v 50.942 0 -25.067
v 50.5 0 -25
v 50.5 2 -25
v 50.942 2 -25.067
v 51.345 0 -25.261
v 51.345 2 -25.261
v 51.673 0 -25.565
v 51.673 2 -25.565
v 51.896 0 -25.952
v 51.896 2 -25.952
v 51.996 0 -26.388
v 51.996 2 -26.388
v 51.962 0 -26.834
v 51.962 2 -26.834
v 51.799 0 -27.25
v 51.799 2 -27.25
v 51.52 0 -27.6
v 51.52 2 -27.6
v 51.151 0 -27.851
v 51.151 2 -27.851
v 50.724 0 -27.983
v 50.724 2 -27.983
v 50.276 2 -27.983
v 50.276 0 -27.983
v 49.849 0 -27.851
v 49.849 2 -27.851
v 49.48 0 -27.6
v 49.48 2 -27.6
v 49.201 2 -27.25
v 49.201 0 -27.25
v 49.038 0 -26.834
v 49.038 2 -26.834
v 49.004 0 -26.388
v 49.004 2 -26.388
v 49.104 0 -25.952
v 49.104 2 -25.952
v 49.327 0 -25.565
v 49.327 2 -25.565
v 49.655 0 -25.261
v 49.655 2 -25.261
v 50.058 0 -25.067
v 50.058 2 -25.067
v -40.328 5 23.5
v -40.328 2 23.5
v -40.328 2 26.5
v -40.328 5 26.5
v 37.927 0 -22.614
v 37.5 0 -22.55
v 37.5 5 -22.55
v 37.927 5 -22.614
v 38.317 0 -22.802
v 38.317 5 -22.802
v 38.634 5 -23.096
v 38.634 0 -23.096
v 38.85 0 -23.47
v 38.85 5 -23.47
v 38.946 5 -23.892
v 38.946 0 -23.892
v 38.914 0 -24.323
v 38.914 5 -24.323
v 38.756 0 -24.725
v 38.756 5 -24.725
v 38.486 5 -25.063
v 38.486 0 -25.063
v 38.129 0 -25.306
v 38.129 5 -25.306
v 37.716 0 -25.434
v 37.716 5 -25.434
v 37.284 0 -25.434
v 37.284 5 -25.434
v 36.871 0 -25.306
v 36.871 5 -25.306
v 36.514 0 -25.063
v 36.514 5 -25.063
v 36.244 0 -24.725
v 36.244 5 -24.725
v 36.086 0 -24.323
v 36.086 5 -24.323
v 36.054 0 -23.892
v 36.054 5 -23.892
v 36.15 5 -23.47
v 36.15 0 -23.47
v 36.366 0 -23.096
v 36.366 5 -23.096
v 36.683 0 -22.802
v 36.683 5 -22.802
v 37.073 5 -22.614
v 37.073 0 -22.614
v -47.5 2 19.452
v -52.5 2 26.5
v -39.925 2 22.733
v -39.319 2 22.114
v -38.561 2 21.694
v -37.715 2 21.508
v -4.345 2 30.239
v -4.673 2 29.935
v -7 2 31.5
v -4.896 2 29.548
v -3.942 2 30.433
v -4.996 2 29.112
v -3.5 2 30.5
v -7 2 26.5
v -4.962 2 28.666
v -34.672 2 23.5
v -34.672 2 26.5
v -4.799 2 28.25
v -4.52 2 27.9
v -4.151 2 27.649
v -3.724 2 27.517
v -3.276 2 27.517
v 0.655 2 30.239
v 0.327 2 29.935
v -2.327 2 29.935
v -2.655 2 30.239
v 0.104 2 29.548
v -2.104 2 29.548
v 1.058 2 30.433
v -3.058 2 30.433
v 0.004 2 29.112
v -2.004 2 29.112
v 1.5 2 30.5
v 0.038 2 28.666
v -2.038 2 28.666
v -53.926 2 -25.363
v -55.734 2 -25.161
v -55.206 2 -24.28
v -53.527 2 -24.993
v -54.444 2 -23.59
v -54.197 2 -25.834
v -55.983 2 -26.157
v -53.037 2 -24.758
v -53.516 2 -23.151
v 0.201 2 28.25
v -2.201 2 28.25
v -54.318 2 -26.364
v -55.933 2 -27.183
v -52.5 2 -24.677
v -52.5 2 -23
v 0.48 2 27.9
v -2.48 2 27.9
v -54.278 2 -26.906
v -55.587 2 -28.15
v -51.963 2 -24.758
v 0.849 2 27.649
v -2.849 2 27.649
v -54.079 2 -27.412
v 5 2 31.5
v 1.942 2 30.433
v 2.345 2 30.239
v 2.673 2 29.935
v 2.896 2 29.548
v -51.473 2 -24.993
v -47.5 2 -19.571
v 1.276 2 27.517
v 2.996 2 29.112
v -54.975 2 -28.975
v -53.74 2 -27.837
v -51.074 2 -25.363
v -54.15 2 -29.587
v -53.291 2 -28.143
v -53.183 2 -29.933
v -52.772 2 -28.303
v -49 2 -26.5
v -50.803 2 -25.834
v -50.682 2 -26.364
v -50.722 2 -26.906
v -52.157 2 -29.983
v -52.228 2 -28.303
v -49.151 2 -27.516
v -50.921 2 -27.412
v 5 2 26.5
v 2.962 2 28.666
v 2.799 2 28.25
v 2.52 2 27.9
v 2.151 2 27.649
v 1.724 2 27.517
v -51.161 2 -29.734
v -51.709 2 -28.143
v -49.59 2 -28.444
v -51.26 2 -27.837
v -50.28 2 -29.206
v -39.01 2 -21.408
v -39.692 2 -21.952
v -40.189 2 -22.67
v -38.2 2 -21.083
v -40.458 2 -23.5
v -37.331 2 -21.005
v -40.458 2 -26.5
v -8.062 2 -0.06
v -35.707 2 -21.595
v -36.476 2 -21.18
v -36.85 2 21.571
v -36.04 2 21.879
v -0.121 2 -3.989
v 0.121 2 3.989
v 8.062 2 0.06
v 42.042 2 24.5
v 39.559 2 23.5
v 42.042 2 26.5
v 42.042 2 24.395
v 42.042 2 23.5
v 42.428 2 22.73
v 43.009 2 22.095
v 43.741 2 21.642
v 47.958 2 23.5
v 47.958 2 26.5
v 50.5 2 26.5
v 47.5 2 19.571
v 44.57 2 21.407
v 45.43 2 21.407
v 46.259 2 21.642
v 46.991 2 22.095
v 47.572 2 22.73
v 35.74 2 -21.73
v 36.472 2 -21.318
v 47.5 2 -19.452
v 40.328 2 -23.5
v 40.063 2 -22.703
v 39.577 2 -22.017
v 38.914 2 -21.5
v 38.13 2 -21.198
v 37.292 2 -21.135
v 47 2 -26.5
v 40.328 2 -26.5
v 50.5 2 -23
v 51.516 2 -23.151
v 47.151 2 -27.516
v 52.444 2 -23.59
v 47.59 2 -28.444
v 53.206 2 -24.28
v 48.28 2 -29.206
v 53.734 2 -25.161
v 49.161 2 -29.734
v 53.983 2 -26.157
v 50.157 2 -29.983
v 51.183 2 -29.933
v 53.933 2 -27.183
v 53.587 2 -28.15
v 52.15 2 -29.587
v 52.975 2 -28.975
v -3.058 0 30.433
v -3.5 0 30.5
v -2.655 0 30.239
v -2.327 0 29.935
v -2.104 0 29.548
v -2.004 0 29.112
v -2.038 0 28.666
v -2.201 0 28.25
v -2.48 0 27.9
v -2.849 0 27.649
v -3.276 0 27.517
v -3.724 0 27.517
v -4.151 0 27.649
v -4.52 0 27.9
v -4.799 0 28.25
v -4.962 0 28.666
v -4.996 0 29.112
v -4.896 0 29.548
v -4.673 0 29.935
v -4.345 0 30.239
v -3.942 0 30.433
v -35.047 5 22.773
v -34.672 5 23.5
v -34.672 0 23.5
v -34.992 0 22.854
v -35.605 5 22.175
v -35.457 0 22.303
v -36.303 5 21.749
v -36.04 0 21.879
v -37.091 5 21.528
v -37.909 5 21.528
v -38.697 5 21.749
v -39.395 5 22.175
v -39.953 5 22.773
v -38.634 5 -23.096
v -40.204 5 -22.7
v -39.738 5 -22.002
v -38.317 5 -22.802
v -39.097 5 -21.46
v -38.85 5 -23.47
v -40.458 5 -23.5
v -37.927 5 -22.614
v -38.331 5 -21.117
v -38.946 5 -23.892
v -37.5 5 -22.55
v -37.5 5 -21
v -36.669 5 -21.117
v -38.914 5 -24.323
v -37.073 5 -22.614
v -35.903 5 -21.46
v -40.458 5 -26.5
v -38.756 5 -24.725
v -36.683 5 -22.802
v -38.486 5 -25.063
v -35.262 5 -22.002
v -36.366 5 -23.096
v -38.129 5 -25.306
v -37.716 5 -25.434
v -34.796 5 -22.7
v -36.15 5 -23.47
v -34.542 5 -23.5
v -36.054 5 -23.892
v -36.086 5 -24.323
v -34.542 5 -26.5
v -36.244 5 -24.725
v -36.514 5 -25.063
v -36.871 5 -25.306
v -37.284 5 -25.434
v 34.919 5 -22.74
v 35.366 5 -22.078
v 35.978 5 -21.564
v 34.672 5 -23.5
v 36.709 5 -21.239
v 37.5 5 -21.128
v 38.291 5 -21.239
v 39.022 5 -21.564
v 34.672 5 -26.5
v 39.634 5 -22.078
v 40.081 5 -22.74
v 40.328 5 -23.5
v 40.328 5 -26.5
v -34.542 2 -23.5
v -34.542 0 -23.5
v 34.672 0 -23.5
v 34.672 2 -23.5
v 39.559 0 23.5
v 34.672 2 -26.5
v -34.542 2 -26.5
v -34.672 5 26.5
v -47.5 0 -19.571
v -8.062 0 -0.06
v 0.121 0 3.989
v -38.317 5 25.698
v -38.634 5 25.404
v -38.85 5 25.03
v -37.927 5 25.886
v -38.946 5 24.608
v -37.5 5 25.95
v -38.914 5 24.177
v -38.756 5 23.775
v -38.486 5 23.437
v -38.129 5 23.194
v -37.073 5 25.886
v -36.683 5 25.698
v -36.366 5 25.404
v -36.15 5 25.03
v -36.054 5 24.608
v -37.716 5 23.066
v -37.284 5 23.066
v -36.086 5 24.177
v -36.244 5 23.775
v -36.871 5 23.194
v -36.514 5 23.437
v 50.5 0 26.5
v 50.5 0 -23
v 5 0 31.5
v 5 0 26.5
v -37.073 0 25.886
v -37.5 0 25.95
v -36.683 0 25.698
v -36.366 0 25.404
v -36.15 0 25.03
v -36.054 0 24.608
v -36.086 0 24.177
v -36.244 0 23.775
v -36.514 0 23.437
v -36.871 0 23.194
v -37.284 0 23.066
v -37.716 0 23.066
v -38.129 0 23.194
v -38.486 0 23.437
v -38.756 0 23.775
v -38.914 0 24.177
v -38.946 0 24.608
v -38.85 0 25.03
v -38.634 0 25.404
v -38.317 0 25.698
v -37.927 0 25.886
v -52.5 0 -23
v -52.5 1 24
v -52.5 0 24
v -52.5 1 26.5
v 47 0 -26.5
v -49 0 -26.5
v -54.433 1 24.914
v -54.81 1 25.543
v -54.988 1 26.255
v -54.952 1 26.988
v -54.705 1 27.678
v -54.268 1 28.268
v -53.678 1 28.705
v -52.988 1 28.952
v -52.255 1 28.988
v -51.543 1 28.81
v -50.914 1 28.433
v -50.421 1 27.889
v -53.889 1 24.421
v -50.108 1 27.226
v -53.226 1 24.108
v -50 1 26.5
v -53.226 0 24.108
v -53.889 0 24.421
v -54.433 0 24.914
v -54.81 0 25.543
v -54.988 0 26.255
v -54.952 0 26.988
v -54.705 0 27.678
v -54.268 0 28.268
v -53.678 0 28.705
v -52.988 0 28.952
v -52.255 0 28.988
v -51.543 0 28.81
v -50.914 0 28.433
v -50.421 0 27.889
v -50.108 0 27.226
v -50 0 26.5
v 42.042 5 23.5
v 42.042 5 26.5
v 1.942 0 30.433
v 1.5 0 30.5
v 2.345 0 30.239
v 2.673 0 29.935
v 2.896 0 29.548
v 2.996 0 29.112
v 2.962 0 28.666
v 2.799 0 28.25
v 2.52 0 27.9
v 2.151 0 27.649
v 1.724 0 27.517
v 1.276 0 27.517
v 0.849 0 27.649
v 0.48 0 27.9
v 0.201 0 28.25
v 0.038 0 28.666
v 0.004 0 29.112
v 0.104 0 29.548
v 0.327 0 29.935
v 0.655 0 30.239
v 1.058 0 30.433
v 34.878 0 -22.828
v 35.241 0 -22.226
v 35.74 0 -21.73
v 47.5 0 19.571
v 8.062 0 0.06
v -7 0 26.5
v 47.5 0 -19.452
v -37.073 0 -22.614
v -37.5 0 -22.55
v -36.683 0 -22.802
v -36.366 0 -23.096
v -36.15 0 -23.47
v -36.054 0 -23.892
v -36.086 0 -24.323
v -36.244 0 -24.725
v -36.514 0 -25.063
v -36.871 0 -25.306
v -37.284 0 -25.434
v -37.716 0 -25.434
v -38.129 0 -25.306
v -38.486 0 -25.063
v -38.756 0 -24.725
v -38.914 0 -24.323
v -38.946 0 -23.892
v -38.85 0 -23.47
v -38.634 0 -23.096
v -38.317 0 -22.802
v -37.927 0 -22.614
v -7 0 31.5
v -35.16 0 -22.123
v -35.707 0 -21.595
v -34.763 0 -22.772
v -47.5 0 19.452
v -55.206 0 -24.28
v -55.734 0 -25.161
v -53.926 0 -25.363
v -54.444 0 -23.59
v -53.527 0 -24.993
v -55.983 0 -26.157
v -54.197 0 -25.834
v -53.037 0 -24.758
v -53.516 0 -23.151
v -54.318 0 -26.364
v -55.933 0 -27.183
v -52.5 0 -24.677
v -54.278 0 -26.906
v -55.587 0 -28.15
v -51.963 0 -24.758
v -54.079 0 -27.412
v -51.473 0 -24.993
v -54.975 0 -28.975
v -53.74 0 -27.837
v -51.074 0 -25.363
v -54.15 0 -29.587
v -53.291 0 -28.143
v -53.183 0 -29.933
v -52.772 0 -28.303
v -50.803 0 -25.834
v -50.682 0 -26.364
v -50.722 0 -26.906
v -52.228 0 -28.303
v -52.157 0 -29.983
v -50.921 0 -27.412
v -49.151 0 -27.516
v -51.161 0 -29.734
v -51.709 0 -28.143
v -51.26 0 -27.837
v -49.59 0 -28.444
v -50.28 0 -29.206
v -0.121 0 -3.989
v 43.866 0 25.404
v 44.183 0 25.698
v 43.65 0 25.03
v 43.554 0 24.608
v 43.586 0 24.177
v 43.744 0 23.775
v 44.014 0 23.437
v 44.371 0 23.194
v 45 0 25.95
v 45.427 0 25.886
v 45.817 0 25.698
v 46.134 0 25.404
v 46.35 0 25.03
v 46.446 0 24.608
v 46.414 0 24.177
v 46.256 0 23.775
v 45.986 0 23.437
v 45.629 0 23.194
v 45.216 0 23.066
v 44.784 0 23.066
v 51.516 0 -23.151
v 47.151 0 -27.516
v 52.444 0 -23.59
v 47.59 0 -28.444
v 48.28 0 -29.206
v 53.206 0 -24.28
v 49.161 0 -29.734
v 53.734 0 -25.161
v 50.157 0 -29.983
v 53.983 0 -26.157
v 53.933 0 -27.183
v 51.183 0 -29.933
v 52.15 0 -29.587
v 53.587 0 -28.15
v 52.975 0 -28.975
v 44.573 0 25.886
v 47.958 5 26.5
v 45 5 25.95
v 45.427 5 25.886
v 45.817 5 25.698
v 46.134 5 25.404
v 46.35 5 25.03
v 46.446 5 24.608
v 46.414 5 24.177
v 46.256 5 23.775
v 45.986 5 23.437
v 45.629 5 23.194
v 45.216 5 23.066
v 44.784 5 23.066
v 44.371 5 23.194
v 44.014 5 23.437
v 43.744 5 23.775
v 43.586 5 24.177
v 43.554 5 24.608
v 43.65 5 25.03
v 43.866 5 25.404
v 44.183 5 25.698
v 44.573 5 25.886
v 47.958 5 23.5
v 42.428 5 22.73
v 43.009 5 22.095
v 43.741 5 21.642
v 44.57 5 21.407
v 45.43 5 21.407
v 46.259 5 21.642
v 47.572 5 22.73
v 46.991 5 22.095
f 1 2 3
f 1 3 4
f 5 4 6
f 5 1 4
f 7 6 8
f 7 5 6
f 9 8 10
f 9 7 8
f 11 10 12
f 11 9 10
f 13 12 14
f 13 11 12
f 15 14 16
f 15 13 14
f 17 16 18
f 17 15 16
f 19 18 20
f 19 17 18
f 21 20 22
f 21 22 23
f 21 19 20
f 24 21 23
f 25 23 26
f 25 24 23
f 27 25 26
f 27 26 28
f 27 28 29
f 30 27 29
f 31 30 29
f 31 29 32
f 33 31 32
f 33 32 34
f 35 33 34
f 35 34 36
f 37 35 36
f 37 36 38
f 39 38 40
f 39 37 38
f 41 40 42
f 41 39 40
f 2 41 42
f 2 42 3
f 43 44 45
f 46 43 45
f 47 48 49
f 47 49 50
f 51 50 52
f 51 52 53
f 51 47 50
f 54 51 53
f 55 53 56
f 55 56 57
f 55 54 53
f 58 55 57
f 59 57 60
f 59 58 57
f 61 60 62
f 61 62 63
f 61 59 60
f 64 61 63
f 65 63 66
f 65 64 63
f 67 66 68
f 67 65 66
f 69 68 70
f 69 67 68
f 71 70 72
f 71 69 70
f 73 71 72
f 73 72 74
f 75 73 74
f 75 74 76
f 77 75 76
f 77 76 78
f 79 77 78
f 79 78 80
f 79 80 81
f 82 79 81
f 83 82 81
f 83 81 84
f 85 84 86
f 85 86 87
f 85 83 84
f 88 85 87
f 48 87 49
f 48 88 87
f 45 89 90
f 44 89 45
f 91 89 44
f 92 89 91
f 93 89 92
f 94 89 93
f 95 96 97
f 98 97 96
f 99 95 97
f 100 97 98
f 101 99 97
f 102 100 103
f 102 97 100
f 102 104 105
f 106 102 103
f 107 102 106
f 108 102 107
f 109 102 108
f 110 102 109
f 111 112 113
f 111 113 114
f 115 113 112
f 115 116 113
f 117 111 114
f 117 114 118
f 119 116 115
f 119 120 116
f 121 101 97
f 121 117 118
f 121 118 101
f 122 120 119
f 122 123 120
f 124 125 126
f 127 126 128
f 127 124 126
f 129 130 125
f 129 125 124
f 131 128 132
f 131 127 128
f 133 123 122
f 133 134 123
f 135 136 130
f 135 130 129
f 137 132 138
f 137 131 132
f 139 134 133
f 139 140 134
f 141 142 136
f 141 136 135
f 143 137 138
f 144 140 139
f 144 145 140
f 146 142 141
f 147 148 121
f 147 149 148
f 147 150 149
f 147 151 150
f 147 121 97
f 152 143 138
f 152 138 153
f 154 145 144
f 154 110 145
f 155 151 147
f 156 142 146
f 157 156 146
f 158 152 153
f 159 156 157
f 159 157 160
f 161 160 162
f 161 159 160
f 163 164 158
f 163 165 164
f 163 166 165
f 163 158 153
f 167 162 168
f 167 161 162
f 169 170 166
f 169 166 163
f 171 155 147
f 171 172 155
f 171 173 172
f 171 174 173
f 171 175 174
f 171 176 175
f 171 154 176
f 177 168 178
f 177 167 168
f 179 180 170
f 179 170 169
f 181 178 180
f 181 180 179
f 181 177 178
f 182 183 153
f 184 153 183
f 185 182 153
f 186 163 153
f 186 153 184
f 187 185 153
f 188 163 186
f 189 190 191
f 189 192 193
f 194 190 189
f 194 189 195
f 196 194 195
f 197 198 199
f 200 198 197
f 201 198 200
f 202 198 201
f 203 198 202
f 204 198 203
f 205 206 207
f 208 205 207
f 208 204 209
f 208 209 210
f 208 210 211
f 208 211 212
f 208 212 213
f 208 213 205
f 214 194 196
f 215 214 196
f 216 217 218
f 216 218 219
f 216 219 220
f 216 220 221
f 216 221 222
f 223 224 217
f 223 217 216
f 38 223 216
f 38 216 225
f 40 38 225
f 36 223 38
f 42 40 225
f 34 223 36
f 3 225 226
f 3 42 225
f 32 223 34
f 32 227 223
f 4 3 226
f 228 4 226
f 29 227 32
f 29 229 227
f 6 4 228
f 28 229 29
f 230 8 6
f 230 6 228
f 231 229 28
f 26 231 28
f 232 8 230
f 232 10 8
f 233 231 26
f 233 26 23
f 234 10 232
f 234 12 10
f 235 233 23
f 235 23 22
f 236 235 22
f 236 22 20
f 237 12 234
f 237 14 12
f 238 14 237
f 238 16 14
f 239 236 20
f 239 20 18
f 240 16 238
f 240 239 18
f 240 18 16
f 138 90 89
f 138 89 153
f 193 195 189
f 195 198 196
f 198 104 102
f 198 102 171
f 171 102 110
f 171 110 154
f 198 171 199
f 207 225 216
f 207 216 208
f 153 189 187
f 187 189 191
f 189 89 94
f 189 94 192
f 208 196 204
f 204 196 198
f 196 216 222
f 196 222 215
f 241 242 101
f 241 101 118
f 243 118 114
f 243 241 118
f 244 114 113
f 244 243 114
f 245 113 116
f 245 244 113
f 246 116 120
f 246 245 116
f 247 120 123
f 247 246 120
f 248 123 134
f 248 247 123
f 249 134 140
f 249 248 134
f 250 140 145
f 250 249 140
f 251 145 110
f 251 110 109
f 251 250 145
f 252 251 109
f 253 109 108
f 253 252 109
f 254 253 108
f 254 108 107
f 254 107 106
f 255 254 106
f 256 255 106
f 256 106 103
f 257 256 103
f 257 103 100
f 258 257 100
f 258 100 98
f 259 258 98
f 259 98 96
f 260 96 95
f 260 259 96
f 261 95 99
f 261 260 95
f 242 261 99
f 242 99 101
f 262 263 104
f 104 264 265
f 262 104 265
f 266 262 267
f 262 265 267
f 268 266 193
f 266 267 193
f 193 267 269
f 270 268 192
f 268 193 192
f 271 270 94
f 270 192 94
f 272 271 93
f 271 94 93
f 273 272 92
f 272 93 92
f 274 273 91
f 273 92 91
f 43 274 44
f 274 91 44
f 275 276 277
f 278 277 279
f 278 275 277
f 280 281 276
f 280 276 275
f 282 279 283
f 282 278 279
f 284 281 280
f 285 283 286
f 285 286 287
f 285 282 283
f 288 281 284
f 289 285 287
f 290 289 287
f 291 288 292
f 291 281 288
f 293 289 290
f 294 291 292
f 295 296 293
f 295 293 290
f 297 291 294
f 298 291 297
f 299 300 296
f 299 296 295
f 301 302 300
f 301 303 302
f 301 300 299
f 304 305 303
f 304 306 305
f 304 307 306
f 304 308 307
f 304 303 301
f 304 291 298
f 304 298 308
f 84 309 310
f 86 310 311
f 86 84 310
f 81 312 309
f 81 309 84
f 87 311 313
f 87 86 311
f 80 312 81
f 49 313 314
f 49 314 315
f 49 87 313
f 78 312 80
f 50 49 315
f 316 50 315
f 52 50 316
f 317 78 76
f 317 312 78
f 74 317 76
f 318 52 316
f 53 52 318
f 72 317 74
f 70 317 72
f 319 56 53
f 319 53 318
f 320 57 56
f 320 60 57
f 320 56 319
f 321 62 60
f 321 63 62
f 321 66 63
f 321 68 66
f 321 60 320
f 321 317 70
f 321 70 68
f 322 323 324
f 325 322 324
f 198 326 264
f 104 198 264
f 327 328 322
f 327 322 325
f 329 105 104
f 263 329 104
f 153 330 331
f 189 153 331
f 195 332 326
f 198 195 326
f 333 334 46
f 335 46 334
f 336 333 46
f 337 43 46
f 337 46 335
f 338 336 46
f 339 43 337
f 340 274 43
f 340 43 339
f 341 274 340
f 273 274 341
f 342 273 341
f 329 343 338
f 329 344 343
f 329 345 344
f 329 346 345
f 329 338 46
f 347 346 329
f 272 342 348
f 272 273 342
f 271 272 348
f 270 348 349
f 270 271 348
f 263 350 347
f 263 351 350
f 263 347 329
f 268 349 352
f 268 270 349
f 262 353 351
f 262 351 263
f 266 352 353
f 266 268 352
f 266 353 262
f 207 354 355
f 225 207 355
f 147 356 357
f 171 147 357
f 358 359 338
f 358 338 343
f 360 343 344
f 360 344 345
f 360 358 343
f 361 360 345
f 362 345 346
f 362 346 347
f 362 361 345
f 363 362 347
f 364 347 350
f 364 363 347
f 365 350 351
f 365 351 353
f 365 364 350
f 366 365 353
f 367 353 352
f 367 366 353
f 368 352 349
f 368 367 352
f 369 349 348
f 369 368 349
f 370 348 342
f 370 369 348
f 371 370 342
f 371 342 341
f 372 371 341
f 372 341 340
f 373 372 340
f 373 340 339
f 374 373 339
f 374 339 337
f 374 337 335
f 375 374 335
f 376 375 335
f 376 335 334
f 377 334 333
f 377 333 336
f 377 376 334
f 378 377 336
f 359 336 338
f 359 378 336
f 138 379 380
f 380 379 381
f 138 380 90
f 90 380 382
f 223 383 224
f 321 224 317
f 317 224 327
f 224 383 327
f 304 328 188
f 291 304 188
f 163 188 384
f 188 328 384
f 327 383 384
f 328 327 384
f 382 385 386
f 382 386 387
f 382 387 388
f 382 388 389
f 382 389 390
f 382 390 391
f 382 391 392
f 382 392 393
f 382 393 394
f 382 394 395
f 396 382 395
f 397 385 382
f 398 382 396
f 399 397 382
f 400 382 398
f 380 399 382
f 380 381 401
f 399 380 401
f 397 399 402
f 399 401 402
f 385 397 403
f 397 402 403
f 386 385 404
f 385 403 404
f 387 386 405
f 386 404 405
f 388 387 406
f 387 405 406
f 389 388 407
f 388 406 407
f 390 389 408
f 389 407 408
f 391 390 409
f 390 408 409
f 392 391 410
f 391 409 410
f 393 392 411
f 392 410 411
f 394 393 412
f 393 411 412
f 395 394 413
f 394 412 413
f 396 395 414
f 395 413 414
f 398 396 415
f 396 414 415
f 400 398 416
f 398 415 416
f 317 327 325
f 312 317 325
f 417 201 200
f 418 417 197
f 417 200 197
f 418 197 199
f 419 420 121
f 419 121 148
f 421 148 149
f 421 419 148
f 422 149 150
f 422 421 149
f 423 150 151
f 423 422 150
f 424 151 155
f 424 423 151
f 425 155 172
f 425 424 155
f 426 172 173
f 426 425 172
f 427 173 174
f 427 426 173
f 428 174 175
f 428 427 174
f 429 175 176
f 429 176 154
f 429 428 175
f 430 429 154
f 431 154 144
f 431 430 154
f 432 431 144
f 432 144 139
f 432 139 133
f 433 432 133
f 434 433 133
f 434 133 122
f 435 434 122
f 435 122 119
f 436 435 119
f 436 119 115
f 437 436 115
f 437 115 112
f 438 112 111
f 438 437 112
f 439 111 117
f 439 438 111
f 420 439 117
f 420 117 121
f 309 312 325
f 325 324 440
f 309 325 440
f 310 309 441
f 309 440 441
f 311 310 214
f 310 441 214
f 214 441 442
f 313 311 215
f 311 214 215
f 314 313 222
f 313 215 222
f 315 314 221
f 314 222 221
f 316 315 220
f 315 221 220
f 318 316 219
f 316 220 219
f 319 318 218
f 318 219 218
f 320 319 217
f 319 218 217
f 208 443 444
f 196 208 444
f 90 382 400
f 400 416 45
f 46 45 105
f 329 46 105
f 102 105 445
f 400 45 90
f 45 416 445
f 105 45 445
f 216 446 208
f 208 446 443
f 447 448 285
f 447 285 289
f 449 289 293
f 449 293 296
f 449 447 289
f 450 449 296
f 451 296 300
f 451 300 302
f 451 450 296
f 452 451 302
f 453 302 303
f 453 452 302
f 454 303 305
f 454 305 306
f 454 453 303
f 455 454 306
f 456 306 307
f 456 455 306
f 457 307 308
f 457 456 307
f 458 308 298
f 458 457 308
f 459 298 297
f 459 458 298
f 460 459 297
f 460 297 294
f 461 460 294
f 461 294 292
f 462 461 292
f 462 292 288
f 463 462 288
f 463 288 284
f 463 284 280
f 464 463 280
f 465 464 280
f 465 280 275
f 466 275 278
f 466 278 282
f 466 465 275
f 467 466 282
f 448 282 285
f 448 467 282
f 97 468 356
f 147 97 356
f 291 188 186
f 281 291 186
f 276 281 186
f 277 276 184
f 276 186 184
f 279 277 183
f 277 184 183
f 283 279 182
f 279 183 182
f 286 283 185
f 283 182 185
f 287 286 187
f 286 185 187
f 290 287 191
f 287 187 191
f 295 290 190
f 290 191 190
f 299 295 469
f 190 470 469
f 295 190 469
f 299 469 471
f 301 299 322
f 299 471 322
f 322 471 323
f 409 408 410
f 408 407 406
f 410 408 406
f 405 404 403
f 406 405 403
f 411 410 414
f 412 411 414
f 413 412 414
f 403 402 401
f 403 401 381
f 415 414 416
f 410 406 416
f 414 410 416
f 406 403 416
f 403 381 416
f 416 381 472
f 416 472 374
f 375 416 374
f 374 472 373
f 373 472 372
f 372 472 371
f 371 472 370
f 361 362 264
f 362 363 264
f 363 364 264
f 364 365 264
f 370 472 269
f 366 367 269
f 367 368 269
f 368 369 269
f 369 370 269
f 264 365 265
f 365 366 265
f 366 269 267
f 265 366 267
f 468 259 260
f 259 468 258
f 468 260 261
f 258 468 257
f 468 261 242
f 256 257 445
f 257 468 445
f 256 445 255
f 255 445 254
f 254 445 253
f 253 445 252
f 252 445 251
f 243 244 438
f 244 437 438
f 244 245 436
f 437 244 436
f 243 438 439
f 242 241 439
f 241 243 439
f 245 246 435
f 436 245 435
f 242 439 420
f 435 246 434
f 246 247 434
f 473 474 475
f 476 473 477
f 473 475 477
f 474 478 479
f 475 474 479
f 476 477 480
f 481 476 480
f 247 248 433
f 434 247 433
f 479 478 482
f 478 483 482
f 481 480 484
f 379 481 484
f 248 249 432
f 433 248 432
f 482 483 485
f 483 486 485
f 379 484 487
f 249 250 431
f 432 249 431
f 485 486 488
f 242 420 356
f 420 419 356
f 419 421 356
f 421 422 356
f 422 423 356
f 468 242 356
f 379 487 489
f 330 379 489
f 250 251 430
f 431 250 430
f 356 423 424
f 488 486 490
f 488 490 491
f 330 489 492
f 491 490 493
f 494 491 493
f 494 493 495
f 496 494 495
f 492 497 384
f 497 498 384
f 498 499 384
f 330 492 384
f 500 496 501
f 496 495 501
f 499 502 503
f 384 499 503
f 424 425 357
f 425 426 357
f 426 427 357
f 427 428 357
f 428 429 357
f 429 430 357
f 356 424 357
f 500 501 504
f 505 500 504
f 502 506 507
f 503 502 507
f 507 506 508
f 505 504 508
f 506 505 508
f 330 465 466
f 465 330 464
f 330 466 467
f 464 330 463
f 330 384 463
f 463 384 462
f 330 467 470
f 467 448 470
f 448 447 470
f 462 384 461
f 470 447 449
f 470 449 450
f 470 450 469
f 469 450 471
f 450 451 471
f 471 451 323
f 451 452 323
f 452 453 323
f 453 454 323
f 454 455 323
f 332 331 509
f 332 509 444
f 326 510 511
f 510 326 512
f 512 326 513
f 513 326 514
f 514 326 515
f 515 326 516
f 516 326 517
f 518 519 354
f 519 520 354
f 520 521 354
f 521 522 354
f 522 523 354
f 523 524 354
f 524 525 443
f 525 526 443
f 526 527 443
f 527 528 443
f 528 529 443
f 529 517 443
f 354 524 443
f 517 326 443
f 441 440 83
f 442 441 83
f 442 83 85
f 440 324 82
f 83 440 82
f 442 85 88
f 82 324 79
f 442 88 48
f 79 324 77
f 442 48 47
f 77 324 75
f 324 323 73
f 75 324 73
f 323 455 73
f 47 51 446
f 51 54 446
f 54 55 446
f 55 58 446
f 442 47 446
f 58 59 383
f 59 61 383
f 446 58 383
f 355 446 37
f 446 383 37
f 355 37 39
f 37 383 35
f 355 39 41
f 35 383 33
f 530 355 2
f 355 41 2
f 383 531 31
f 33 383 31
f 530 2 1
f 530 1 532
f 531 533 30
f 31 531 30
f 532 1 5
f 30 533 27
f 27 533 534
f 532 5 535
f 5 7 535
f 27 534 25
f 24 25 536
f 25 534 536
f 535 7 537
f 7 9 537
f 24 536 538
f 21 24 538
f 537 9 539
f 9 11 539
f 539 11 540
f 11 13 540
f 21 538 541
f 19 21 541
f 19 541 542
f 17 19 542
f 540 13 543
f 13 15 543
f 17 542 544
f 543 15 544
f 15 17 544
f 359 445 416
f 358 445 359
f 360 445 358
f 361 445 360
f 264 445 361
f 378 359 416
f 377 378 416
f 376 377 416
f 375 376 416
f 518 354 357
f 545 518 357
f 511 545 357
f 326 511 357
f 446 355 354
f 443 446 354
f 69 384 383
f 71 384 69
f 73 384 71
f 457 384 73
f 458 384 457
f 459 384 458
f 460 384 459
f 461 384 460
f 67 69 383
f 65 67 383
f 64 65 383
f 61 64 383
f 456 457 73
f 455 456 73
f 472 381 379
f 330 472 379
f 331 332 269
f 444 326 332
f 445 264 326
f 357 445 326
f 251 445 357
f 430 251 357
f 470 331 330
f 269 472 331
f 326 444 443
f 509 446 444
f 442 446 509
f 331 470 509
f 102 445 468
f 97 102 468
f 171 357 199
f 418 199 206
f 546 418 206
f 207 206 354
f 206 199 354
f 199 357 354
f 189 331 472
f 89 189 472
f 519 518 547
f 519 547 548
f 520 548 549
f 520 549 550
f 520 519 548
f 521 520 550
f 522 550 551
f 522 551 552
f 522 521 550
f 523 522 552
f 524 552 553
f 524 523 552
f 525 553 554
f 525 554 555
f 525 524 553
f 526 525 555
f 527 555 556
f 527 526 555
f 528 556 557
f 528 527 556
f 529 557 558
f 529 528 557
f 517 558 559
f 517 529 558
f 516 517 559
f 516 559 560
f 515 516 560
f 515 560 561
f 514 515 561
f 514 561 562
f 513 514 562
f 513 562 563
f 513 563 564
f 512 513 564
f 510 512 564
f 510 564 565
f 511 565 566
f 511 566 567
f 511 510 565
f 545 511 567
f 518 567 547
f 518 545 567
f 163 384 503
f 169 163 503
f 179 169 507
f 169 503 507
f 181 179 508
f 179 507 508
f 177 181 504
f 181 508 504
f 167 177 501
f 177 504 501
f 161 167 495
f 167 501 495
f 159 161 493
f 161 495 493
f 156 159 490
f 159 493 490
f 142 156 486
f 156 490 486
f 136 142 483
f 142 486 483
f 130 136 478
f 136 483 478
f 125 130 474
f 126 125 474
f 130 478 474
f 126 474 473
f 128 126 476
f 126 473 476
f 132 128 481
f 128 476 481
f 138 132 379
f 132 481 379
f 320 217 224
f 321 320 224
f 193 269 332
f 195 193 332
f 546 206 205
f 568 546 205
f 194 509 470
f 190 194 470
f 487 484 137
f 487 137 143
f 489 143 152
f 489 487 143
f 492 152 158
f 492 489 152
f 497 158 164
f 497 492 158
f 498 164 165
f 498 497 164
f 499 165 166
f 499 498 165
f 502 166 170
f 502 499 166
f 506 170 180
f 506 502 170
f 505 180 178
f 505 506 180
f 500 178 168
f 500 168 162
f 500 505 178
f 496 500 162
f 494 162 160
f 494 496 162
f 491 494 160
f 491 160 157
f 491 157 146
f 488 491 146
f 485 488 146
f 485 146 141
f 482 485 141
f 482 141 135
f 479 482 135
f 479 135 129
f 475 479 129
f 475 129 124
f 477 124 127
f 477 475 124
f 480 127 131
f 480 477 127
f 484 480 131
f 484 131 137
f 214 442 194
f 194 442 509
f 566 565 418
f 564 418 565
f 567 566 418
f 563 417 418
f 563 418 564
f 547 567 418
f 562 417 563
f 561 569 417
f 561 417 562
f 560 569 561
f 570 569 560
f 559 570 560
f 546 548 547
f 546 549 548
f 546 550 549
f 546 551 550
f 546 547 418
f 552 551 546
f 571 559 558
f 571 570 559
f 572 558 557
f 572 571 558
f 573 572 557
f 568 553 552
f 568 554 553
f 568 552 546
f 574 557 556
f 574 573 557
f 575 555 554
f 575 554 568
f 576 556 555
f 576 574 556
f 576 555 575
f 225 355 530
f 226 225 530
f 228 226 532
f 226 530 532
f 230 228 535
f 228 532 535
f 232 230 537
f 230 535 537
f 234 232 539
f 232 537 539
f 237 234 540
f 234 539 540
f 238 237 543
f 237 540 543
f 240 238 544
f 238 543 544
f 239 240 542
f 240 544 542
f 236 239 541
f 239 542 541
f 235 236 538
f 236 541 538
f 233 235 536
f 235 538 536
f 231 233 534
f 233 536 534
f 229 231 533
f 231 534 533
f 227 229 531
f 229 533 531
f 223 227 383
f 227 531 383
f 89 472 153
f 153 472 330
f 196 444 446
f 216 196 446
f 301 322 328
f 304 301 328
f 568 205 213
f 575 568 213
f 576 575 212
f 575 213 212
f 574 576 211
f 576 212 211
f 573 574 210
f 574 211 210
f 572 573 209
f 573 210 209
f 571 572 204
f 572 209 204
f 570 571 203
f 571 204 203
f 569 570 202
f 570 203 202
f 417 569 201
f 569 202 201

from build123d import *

# Parameters (mm, degrees)
SKETCH1_R             = 1.5
SKETCH1_R_2           = 1.823358757
BOSS_EXTRUDE1_DEPTH   = 2
SKETCH1_W             = 69.213532985
SKETCH1_H             = 3
BOSS_EXTRUDE1_2_DEPTH = 2
SKETCH2_R             = 1.45
SKETCH2_R_2           = 1.449999997
BOSS_EXTRUDE2_DEPTH   = 5
SKETCH3_R             = 2.5
BOSS_EXTRUDE3_DEPTH   = 1


with BuildPart() as part:
    # Sketch1 → Boss-Extrude1 (new body)
    with BuildSketch(Plane(origin=(0, 0, 0), x_dir=(1, 0, 0), z_dir=(0, 1, 0))):
        with BuildLine():
            Line((40.328427125, 26.5), (40.328427125, 23.5))
            ThreePointArc((40.328427125, 23.5), (38.533566599, 21.320123126), (35.739793711, 21.730270106))
            Line((35.739793711, 21.730270106), (-0.120981949, 3.988623195))
            Line((-0.120981949, 3.988623195), (-35.707345562, 21.594508352))
            ThreePointArc((-35.707345562, 21.594508352), (-38.6168059, 21.215624921), (-40.458039892, 23.5))
            Line((-40.458039892, 23.5), (-40.458039892, 26.5))
            Line((-40.458039892, 26.5), (-49, 26.5))
            ThreePointArc((-49, 26.5), (-54.974873735, 28.974873735), (-52.5, 23))
            Line((-52.5, 23), (-52.5, 0))
            Line((-52.5, 0), (-52.5, -26.5))
            Line((-52.5, -26.5), (-40.328427125, -26.5))
            Line((-40.328427125, -26.5), (-40.328427125, -23.5))
            ThreePointArc((-40.328427125, -23.5), (-38.560823049, -21.693818527), (-36.040421728, -21.879001857))
            Line((-36.040421728, -21.879001857), (0.120981949, -3.988623195))
            Line((0.120981949, -3.988623195), (39.558871233, -23.5))
            Line((39.558871233, -23.5), (-34.671572875, -23.5))
            Line((-34.671572875, -23.5), (-34.671572875, -26.5))
            Line((-34.671572875, -26.5), (-7, -26.5))
            Line((-7, -26.5), (-7, -31.5))
            Line((-7, -31.5), (5, -31.5))
            Line((5, -31.5), (5, -26.5))
            Line((5, -26.5), (42.041960109, -26.5))
            Line((42.041960109, -26.5), (42.041960109, -24.5))
            Line((42.041960109, -24.5), (42.041960108, -24.395234694))
            Line((42.041960109, -24.395234694), (42.041960109, -23.5))
            ThreePointArc((42.041960109, -23.5), (45, -21.377501001), (47.958039892, -23.5))
            Line((47.958039892, -23.5), (47.958039892, -26.5))
            Line((47.958039892, -26.5), (50.5, -26.5))
            Line((50.5, -26.5), (50.5, -25.302775638))
            Line((50.5, -25.302775638), (50.5, 22.341687605))
            Line((50.5, 22.341687605), (50.5, 23))
            ThreePointArc((50.5, 23), (52.974873734, 28.974873734), (47, 26.5))
            Line((47, 26.5), (40.328427125, 26.5))
        make_face()
        Polygon((8.062110713, -0.059854228), (47.5, 19.451522577), (47.5, -19.571231035), (42.041960107, -16.870937614), align=None, mode=Mode.SUBTRACT)
        with Locations(Location((-3.5, -29, 0), (0, 0, 270))):
            Circle(SKETCH1_R, mode=Mode.SUBTRACT)
        with Locations(Location((1.5, -29, 0), (0, 0, 270))):
            Circle(SKETCH1_R, mode=Mode.SUBTRACT)
        Polygon((-8.062110713, 0.059854228), (-47.5, -19.451522577), (-47.5, 19.571231035), align=None, mode=Mode.SUBTRACT)
        with Locations(Location((-52.5, 26.5, 0), (0, 0, 270))):
            Circle(SKETCH1_R_2, mode=Mode.SUBTRACT)
        with Locations(Location((50.5, 26.5, 0), (0, 0, 270))):
            Circle(SKETCH1_R, mode=Mode.SUBTRACT)
    extrude(amount=BOSS_EXTRUDE1_DEPTH)



with BuildPart() as body_2:
    # Sketch1 → Boss-Extrude1 2 (new body)
    with BuildSketch(Plane(origin=(0, 0, 0), x_dir=(1, 0, 0), z_dir=(0, 1, 0))):
        with Locations((0.064806384, 25)):
            Rectangle(SKETCH1_W, SKETCH1_H)
    extrude(amount=BOSS_EXTRUDE1_2_DEPTH)


with BuildPart() as part_1:
    add(part.part)

    add(body_2.part)  # Boss-Extrude2 merges body 2
    # Sketch2 → Boss-Extrude2 (add)
    # profile 1 of 4: a face of its own
    with BuildSketch(Plane(origin=(0, 0, 0), x_dir=(1, 0, 0), z_dir=(0, 1, 0))):
        with BuildLine():
            ThreePointArc((-34.671572875, -23.5), (-37.5, -21.5), (-40.328427125, -23.5))
            Line((-40.328427125, -23.5), (-40.328427125, -26.5))
            Line((-40.328427125, -26.5), (-34.671572875, -26.5))
            Line((-34.671572875, -26.5), (-34.671572875, -23.5))
        make_face()
        with Locations(Location((-37.5, -24.5, 0), (0, 0, 270))):
            Circle(SKETCH2_R, mode=Mode.SUBTRACT)
    # profile 2 of 4: a face of its own
    with BuildSketch(Plane(origin=(0, 0, 0), x_dir=(1, 0, 0), z_dir=(0, 1, 0))):
        with BuildLine():
            Line((-40.458039892, 26.5), (-40.458039892, 23.5))
            ThreePointArc((-40.458039892, 23.5), (-37.5, 21), (-34.541960108, 23.5))
            Line((-34.541960108, 23.5), (-34.541960108, 26.5))
            Line((-34.541960108, 26.5), (-40.458039892, 26.5))
        make_face()
        with Locations(Location((-37.5, 24, 0), (0, 0, 270))):
            Circle(SKETCH2_R, mode=Mode.SUBTRACT)
    # profile 3 of 4: a face of its own
    with BuildSketch(Plane(origin=(0, 0, 0), x_dir=(1, 0, 0), z_dir=(0, 1, 0))):
        with BuildLine():
            ThreePointArc((47.958039892, -23.5), (45, -21.377501001), (42.041960109, -23.5))
            Line((42.041960109, -23.5), (42.041960109, -26.5))
            Line((42.041960109, -26.5), (47.397915762, -26.5))
            Line((47.397915762, -26.5), (47.958039892, -26.5))
            Line((47.958039892, -26.5), (47.958039892, -23.5))
        make_face()
        with Locations(Location((45, -24.5, 0), (0, 0, 270))):
            Circle(SKETCH2_R, mode=Mode.SUBTRACT)
    # profile 4 of 4: a face of its own
    with BuildSketch(Plane(origin=(0, 0, 0), x_dir=(1, 0, 0), z_dir=(0, 1, 0))):
        with BuildLine():
            Line((40.328427125, 26.5), (34.671572877, 26.5))
            Line((34.671572877, 26.5), (34.671572877, 23.5))
            ThreePointArc((34.671572877, 23.5), (37.500000001, 21.127718682), (40.328427125, 23.5))
            Line((40.328427125, 23.5), (40.328427125, 24))
            Line((40.328427125, 24), (40.328427125, 26.5))
        make_face()
        with Locations(Location((37.500000001, 24.000000006, 0), (0, 0, 270))):
            Circle(SKETCH2_R_2, mode=Mode.SUBTRACT)
    extrude(amount=BOSS_EXTRUDE2_DEPTH)

    # Sketch3 → Boss-Extrude3 (add)
    with BuildSketch(Plane(origin=(0, 0, 0), x_dir=(1, 0, 0), z_dir=(0, 1, 0))):
        with Locations((-52.5, -26.5)):
            Circle(SKETCH3_R)
    extrude(amount=BOSS_EXTRUDE3_DEPTH)


solid = part_1.part
